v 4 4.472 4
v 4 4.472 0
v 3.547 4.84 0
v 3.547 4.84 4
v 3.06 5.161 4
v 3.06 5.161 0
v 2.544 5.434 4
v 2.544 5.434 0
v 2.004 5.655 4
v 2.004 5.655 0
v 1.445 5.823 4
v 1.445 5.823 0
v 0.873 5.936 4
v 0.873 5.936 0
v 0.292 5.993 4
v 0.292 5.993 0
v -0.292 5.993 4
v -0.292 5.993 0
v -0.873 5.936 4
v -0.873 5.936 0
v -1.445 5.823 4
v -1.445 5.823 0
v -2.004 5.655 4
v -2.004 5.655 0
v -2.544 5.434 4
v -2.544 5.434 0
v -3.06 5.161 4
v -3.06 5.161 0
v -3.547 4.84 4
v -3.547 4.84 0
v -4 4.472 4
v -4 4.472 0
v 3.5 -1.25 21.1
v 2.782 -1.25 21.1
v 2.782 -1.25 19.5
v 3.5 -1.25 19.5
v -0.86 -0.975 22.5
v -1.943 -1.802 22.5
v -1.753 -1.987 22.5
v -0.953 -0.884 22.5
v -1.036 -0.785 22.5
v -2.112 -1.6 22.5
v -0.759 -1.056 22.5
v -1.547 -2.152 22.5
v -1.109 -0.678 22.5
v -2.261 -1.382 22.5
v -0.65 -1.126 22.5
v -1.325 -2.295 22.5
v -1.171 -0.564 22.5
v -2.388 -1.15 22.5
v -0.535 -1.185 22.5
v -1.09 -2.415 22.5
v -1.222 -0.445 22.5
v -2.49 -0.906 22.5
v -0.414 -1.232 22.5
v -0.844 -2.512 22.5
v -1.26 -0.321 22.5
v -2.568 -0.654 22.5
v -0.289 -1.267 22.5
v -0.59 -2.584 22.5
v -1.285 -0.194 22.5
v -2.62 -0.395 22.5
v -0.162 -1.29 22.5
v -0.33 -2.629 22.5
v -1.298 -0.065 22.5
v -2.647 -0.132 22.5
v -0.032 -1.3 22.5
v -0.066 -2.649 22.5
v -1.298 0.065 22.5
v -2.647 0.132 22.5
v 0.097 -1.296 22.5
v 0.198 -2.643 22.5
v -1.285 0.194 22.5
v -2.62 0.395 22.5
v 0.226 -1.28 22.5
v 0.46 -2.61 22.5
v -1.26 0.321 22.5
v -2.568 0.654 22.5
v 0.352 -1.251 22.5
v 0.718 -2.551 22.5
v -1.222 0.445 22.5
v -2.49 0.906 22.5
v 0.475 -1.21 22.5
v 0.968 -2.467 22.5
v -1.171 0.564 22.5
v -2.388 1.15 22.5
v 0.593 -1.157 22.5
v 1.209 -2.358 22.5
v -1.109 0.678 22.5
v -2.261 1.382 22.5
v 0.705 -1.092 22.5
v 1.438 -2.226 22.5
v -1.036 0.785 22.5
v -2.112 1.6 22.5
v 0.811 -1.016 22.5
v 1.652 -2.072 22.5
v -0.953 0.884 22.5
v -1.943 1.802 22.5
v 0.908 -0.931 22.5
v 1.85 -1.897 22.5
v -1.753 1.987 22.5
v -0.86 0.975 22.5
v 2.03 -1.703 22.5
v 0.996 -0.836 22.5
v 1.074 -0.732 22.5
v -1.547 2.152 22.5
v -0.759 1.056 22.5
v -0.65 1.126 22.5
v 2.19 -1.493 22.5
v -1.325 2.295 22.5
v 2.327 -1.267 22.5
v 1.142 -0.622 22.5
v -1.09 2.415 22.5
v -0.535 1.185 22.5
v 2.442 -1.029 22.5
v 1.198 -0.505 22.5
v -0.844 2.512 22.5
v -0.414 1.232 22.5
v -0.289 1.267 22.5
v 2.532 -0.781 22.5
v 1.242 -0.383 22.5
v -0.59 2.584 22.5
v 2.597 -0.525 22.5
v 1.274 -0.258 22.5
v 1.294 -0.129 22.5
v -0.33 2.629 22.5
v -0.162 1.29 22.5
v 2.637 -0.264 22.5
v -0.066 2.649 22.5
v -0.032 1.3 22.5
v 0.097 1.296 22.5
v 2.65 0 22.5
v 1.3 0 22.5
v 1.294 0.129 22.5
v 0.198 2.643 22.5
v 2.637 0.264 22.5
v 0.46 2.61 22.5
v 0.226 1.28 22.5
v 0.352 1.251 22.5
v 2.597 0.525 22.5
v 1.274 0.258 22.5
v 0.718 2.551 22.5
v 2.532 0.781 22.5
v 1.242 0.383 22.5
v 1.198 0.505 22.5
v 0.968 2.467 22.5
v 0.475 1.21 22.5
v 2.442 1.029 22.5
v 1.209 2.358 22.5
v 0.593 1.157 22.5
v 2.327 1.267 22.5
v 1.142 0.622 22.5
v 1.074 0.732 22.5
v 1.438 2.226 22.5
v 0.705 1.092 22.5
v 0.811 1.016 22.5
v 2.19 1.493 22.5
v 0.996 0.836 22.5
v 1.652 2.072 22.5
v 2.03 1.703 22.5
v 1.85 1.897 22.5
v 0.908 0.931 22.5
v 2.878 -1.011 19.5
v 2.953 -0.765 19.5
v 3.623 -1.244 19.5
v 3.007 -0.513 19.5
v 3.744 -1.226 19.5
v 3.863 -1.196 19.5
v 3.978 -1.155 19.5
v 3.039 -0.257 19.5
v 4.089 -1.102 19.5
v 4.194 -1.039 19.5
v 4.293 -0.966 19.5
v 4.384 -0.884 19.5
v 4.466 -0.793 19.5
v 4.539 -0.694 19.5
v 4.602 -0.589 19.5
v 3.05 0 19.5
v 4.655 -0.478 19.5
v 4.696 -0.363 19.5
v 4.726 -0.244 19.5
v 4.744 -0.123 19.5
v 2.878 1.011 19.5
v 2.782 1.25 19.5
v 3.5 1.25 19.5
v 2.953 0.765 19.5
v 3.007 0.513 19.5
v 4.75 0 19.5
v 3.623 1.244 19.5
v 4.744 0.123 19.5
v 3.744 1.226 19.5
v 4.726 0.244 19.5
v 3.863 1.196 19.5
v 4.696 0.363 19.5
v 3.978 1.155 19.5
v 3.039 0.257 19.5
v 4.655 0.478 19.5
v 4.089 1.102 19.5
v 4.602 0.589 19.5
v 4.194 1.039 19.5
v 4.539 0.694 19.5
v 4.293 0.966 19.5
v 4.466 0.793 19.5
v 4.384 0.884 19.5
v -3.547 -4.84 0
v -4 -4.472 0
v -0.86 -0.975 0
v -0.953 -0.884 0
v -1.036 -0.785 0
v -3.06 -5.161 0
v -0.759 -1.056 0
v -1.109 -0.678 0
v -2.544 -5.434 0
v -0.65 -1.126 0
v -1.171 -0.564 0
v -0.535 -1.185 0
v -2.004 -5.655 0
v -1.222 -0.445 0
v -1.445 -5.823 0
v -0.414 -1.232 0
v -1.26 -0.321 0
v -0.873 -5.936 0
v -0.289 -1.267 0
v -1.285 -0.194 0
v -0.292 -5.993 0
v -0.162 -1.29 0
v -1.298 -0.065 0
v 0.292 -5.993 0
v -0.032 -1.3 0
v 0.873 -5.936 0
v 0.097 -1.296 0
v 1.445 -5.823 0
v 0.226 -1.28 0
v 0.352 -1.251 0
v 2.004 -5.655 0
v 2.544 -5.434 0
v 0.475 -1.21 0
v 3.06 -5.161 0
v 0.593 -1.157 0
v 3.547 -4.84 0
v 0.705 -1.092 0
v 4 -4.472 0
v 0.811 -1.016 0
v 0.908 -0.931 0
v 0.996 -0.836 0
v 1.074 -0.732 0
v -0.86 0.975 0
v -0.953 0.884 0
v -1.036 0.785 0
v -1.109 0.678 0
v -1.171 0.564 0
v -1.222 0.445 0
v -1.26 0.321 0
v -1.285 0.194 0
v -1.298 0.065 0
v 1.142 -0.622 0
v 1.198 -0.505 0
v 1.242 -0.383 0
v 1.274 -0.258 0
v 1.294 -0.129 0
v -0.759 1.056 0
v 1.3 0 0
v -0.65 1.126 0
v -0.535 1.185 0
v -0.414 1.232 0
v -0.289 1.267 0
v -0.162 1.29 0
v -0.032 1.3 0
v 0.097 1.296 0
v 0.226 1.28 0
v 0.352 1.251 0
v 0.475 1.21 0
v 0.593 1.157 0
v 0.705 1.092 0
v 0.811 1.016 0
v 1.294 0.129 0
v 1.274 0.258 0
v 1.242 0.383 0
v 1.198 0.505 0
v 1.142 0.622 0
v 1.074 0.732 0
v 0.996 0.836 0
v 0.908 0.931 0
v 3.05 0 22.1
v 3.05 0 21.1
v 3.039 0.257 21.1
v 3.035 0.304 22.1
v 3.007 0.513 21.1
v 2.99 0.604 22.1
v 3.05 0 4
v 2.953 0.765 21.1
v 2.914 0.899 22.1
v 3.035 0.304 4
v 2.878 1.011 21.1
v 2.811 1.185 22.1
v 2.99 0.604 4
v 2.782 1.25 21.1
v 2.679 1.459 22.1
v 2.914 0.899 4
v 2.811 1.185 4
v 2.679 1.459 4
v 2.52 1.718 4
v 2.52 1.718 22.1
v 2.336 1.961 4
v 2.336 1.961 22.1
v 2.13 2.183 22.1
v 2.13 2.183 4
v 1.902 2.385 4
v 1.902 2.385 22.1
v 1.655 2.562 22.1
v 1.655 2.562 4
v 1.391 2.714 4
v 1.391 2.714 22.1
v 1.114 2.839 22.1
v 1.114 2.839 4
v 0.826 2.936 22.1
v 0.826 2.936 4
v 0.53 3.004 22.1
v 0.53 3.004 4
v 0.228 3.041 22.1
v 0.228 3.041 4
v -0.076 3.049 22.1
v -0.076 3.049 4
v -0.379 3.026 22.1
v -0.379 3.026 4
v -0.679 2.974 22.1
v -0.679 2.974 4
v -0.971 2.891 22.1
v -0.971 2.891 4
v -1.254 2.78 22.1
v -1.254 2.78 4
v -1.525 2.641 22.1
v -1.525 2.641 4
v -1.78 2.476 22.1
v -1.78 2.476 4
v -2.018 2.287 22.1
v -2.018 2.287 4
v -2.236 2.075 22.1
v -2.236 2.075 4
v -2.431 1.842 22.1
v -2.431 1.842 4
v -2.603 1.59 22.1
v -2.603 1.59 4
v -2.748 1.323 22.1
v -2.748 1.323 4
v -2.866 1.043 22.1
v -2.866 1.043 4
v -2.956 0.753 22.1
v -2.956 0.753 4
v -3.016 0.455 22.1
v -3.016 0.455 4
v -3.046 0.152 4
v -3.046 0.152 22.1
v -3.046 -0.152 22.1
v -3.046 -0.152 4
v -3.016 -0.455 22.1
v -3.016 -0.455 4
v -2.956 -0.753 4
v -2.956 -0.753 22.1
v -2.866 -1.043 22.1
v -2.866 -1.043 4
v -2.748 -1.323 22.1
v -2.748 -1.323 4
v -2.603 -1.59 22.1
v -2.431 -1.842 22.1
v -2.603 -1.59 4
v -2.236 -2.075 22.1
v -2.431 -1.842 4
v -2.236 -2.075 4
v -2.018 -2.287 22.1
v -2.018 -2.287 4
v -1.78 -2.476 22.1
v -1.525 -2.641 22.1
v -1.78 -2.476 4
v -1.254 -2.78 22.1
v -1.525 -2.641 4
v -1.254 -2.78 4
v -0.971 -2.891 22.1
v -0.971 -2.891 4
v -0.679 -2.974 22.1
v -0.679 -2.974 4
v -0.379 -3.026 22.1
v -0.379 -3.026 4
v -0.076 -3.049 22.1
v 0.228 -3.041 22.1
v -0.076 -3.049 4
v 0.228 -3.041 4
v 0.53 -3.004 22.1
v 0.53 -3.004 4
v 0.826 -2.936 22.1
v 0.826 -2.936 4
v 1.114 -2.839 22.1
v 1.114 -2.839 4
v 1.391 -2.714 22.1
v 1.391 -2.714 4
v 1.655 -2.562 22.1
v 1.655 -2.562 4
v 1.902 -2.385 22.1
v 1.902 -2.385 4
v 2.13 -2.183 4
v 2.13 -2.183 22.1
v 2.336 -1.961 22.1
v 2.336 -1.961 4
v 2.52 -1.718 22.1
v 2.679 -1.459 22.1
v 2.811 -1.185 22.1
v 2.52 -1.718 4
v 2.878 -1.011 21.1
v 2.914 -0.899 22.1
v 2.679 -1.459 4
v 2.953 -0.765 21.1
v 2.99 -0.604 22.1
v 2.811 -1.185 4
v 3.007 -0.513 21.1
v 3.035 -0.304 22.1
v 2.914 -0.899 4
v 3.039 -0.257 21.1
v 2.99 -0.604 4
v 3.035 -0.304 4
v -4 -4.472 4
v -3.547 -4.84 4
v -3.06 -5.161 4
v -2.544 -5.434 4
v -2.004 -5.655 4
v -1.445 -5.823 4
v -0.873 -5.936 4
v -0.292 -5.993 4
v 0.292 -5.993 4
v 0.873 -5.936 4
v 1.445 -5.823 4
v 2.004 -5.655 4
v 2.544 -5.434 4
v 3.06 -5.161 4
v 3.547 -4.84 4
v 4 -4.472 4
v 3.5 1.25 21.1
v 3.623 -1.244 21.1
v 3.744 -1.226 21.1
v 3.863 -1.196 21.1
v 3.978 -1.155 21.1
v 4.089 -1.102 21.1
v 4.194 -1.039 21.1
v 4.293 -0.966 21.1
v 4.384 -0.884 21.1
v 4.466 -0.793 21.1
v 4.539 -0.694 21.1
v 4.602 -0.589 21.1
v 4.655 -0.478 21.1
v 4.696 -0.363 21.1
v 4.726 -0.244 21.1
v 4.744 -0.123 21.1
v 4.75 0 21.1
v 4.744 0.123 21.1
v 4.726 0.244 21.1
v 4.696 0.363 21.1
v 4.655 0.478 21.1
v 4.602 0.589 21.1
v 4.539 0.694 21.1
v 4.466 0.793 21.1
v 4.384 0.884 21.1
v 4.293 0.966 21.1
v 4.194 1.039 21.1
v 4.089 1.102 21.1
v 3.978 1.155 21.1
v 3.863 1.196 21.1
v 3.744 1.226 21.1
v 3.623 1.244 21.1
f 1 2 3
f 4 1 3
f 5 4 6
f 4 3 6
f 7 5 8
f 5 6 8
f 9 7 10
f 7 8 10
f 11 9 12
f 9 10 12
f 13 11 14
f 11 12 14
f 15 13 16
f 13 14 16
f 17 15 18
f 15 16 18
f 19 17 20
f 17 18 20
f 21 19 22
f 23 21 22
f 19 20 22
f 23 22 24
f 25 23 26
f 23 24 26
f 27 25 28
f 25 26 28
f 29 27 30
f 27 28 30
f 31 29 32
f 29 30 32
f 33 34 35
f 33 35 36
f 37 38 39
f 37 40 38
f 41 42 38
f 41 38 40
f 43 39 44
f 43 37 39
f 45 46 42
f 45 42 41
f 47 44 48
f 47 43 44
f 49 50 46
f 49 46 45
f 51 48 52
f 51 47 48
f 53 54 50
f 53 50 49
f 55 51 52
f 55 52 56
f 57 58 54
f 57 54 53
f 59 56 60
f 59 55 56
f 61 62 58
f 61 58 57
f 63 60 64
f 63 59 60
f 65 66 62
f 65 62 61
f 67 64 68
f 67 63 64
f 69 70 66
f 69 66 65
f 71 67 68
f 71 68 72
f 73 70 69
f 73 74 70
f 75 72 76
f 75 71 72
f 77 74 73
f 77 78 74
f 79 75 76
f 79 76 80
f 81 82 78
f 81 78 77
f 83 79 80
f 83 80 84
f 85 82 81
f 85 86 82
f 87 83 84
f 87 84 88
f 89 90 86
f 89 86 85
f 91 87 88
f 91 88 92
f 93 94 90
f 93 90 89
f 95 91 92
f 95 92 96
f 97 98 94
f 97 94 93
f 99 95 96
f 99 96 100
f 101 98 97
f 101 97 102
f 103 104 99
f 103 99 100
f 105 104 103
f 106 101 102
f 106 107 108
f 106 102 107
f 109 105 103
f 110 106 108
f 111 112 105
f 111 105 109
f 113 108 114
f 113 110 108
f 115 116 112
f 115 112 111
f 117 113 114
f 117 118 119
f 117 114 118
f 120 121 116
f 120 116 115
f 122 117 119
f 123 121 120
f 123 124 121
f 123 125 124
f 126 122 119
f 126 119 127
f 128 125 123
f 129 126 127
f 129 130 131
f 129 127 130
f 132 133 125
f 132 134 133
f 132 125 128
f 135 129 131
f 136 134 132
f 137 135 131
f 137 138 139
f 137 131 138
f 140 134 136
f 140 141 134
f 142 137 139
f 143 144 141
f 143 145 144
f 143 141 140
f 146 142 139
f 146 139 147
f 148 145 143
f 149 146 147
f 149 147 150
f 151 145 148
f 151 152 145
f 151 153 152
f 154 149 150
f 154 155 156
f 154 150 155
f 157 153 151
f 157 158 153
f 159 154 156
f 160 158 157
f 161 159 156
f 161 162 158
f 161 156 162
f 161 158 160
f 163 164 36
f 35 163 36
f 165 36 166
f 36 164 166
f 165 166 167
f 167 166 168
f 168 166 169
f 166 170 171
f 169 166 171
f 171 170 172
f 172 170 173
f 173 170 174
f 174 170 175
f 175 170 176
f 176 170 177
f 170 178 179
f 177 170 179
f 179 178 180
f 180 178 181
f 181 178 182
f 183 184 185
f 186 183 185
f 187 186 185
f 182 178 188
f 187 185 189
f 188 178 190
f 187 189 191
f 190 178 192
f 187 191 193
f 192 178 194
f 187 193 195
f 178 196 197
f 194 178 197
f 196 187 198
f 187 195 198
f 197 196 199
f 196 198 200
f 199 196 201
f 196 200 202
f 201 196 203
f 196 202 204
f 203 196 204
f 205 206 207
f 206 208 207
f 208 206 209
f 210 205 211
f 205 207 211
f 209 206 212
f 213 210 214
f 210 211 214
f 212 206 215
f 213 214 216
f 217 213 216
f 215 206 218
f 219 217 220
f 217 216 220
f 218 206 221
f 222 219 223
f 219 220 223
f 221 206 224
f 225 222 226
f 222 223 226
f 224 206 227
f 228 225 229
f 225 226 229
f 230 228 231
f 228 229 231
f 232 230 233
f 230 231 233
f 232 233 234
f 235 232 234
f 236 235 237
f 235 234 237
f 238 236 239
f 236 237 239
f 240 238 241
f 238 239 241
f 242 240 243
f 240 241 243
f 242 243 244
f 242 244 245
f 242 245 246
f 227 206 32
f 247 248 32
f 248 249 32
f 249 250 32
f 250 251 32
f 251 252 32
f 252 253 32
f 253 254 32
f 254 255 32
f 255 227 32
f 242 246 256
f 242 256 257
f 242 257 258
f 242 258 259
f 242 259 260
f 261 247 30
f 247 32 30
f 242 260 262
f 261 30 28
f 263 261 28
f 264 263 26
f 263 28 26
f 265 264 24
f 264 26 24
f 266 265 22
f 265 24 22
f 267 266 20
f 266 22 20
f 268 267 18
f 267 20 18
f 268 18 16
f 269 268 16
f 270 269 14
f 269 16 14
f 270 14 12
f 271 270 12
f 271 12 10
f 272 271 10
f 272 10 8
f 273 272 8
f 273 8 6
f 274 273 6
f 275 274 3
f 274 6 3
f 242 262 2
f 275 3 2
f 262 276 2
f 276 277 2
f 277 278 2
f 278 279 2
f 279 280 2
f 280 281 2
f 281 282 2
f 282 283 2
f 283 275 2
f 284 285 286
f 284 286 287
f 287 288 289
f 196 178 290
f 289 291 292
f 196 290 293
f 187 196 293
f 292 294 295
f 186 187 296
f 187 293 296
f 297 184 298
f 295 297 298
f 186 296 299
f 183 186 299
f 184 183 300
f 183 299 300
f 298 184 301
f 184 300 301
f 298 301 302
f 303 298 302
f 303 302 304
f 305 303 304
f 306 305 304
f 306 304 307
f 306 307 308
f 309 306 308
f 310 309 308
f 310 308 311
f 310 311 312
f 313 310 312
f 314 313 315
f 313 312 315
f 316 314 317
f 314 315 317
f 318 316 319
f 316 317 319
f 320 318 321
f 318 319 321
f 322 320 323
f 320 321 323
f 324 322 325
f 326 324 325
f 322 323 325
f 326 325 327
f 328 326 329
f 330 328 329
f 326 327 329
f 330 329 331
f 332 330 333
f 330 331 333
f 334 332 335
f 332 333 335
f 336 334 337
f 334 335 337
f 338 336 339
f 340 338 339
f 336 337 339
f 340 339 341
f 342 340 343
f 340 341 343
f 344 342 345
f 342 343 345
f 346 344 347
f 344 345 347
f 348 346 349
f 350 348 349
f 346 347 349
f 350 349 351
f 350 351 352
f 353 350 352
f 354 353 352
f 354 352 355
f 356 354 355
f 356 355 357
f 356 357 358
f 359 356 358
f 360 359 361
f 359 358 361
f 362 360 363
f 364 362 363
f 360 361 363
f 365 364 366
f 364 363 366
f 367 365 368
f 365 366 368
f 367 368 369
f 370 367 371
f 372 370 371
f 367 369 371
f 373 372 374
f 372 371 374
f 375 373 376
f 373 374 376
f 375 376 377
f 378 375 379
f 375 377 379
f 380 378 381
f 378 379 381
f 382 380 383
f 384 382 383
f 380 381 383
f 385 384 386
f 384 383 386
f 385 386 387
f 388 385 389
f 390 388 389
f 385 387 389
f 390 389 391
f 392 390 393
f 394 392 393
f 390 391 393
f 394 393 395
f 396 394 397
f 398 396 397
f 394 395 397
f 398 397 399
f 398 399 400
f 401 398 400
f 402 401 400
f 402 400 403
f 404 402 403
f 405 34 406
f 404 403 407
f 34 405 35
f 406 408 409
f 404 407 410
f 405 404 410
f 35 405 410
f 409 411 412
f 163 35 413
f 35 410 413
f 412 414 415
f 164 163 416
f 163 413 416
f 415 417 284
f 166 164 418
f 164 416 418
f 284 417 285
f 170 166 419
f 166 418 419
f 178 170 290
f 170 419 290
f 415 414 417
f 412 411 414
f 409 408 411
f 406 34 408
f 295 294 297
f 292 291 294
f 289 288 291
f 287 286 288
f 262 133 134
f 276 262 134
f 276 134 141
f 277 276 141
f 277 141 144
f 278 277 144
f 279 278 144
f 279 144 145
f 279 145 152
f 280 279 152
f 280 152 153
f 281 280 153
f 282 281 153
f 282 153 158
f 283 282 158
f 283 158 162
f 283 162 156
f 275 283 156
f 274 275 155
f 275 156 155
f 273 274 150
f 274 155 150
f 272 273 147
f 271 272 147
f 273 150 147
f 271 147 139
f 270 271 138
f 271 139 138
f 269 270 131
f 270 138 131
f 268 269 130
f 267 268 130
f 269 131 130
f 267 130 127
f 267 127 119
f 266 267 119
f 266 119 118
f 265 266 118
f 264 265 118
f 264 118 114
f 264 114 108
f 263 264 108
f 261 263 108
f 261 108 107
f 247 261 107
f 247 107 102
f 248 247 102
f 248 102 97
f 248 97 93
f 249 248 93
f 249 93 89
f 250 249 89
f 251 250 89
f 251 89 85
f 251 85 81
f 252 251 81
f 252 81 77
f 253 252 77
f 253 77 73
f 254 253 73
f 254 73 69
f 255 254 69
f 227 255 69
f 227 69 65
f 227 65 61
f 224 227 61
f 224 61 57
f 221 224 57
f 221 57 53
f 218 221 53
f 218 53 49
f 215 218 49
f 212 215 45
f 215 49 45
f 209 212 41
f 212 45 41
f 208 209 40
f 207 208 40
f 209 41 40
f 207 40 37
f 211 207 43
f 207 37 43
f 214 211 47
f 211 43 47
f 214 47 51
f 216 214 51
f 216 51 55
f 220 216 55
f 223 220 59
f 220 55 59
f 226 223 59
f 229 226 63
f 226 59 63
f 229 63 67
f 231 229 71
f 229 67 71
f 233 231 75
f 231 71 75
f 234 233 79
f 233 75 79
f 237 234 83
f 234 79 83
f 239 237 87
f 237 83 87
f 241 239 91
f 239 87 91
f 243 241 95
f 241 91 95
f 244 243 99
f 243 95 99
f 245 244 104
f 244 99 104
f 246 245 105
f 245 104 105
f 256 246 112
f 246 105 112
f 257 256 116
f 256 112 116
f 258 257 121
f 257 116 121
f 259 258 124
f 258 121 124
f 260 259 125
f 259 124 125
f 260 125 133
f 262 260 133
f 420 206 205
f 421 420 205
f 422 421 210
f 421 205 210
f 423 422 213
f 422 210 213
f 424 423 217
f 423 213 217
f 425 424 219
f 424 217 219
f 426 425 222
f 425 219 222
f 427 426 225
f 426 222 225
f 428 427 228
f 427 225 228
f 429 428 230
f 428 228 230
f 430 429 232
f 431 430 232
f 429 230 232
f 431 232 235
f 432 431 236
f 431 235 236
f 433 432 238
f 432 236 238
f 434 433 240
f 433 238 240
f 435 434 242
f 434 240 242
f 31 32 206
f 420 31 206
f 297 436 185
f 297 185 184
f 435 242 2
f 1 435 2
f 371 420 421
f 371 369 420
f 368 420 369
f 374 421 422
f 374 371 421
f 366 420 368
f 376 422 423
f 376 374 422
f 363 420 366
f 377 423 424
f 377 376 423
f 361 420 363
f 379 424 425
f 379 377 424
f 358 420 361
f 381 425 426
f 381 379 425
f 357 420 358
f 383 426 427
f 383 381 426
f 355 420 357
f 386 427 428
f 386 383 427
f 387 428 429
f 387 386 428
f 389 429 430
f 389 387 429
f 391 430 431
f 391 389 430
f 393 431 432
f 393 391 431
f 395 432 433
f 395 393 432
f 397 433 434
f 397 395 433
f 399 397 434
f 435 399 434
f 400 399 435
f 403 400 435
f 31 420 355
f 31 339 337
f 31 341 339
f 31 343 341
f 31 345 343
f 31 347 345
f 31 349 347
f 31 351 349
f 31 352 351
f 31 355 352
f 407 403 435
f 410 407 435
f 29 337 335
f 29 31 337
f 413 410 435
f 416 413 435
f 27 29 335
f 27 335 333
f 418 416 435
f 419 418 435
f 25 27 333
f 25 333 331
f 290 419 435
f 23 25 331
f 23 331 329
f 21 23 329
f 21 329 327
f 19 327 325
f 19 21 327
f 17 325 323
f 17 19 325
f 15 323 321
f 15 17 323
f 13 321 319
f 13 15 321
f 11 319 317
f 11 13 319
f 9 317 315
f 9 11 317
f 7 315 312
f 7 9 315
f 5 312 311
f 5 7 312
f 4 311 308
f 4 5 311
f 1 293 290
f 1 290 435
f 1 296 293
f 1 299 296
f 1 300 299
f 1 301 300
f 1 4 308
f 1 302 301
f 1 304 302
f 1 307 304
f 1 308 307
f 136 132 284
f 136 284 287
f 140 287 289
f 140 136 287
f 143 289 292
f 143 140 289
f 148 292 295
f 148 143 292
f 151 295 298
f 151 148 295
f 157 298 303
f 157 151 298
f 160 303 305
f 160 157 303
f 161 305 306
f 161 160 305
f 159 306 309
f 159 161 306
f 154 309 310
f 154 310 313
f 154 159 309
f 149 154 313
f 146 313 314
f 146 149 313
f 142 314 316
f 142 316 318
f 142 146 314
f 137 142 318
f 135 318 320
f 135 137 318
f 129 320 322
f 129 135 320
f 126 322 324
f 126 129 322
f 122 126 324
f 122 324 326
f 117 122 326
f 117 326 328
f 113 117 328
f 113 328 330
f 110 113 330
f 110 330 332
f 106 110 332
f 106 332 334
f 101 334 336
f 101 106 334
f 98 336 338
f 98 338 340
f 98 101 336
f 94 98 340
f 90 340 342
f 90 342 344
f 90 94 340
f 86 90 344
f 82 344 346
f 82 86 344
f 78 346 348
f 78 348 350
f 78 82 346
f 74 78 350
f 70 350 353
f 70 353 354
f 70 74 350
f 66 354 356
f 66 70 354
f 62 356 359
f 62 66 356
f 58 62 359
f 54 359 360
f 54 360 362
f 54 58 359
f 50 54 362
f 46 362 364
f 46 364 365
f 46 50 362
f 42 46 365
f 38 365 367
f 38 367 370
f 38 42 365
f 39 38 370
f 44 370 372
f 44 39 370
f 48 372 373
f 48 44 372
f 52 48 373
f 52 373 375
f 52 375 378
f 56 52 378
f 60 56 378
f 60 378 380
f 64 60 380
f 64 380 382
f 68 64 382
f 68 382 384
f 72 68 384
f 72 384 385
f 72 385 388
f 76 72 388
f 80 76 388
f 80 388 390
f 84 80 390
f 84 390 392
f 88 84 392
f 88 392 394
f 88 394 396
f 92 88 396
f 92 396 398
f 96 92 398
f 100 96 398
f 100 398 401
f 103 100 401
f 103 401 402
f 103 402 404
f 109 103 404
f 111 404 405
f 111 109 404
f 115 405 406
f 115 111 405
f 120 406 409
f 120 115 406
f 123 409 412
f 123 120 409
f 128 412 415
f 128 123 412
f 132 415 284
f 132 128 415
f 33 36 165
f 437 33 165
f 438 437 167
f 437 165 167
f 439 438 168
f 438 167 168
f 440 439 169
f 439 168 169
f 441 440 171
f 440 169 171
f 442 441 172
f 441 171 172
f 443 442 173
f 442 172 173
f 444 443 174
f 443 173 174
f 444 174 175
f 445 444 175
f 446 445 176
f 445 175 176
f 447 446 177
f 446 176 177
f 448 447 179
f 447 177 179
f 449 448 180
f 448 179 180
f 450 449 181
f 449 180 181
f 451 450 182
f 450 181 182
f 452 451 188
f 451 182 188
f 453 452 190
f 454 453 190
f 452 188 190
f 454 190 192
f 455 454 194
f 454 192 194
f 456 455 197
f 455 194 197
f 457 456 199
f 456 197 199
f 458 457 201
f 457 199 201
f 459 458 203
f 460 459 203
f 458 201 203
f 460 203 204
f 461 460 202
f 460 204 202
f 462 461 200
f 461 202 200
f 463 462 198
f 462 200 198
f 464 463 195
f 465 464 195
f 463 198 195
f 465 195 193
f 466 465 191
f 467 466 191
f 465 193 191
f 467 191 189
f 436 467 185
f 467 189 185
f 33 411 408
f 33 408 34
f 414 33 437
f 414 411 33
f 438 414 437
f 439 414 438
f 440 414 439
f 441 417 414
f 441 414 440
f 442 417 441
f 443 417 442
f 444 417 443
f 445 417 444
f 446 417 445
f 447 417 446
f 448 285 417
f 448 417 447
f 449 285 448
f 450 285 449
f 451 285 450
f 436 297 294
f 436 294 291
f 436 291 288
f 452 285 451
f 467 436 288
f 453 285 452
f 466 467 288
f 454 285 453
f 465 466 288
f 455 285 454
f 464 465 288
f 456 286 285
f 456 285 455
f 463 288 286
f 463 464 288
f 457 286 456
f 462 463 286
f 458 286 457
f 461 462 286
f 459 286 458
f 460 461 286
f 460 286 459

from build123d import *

# Parameters (mm, degrees)
AUFSATZ_LINEAR_AUSTRAGEN1_DEPTH = 4
SKIZZE2_R                       = 3.05
AUFSATZ_LINEAR_AUSTRAGEN2_DEPTH = 18.5
AUFSATZ_LINEAR_START            = 15.5
AUFSATZ_LINEAR_AUSTRAGEN3_DEPTH = 1.6
SCHNITT_LINEAR_AUSTRAGEN1_REACH = 25.766
SKIZZE4_R                       = 1.3
FASE1_SIZE                      = 0.4


with BuildPart() as part:
    # Skizze1 → Aufsatz-Linear austragen1 (new body)
    with BuildSketch(Plane.XY):
        with BuildLine():
            Line((-4, 4.472135955), (-4, -4.472135955))
            ThreePointArc((-4, -4.472135955), (0, -6), (4, -4.472135955))
            Line((4, -4.472135955), (4, 4.472135955))
            ThreePointArc((4, 4.472135955), (0, 6), (-4, 4.472135955))
        make_face()
    extrude(amount=AUFSATZ_LINEAR_AUSTRAGEN1_DEPTH)

    # Skizze2 → Aufsatz-Linear austragen2 (add)
    with BuildSketch(Plane.XY.offset(4)):
        Circle(SKIZZE2_R)
    extrude(amount=AUFSATZ_LINEAR_AUSTRAGEN2_DEPTH)

    # Skizze3 → Aufsatz-Linear austragen3 (add)
    with BuildSketch(Plane.XY.offset(4).offset(AUFSATZ_LINEAR_START)):
        with BuildLine():
            Line((3.5, 1.25), (2.782085549, 1.25))
            ThreePointArc((2.782085549, 1.25), (2.982269348, 0.639194445), (3.05, 0))
            ThreePointArc((3.05, 0), (2.982269348, -0.639194445), (2.782085549, -1.25))
            Line((2.782085549, -1.25), (3.5, -1.25))
            ThreePointArc((3.5, -1.25), (4.75, 0), (3.5, 1.25))
        make_face()
    extrude(amount=AUFSATZ_LINEAR_AUSTRAGEN3_DEPTH)

    # Skizze4 → Schnitt-Linear austragen1 (cut, up to next)
    with BuildSketch(Plane.XY.offset(22.5), mode=Mode.PRIVATE) as schnitt_linear_austragen1_sk1:
        Circle(SKIZZE4_R)
    schnitt_linear_austragen1_tool1 = extrude(schnitt_linear_austragen1_sk1.sketch, amount=-SCHNITT_LINEAR_AUSTRAGEN1_REACH, mode=Mode.PRIVATE) & part.part
    add(schnitt_linear_austragen1_tool1.solids().sort_by_distance((0, 0, 22.5))[0], mode=Mode.SUBTRACT)

    # Fase1
    fase1_edges = [part.edges().sort_by_distance(p)[0] for p in [
        (-3.05, 0, 22.5),
    ]]
    chamfer(fase1_edges, length=FASE1_SIZE)


solid = part.part
